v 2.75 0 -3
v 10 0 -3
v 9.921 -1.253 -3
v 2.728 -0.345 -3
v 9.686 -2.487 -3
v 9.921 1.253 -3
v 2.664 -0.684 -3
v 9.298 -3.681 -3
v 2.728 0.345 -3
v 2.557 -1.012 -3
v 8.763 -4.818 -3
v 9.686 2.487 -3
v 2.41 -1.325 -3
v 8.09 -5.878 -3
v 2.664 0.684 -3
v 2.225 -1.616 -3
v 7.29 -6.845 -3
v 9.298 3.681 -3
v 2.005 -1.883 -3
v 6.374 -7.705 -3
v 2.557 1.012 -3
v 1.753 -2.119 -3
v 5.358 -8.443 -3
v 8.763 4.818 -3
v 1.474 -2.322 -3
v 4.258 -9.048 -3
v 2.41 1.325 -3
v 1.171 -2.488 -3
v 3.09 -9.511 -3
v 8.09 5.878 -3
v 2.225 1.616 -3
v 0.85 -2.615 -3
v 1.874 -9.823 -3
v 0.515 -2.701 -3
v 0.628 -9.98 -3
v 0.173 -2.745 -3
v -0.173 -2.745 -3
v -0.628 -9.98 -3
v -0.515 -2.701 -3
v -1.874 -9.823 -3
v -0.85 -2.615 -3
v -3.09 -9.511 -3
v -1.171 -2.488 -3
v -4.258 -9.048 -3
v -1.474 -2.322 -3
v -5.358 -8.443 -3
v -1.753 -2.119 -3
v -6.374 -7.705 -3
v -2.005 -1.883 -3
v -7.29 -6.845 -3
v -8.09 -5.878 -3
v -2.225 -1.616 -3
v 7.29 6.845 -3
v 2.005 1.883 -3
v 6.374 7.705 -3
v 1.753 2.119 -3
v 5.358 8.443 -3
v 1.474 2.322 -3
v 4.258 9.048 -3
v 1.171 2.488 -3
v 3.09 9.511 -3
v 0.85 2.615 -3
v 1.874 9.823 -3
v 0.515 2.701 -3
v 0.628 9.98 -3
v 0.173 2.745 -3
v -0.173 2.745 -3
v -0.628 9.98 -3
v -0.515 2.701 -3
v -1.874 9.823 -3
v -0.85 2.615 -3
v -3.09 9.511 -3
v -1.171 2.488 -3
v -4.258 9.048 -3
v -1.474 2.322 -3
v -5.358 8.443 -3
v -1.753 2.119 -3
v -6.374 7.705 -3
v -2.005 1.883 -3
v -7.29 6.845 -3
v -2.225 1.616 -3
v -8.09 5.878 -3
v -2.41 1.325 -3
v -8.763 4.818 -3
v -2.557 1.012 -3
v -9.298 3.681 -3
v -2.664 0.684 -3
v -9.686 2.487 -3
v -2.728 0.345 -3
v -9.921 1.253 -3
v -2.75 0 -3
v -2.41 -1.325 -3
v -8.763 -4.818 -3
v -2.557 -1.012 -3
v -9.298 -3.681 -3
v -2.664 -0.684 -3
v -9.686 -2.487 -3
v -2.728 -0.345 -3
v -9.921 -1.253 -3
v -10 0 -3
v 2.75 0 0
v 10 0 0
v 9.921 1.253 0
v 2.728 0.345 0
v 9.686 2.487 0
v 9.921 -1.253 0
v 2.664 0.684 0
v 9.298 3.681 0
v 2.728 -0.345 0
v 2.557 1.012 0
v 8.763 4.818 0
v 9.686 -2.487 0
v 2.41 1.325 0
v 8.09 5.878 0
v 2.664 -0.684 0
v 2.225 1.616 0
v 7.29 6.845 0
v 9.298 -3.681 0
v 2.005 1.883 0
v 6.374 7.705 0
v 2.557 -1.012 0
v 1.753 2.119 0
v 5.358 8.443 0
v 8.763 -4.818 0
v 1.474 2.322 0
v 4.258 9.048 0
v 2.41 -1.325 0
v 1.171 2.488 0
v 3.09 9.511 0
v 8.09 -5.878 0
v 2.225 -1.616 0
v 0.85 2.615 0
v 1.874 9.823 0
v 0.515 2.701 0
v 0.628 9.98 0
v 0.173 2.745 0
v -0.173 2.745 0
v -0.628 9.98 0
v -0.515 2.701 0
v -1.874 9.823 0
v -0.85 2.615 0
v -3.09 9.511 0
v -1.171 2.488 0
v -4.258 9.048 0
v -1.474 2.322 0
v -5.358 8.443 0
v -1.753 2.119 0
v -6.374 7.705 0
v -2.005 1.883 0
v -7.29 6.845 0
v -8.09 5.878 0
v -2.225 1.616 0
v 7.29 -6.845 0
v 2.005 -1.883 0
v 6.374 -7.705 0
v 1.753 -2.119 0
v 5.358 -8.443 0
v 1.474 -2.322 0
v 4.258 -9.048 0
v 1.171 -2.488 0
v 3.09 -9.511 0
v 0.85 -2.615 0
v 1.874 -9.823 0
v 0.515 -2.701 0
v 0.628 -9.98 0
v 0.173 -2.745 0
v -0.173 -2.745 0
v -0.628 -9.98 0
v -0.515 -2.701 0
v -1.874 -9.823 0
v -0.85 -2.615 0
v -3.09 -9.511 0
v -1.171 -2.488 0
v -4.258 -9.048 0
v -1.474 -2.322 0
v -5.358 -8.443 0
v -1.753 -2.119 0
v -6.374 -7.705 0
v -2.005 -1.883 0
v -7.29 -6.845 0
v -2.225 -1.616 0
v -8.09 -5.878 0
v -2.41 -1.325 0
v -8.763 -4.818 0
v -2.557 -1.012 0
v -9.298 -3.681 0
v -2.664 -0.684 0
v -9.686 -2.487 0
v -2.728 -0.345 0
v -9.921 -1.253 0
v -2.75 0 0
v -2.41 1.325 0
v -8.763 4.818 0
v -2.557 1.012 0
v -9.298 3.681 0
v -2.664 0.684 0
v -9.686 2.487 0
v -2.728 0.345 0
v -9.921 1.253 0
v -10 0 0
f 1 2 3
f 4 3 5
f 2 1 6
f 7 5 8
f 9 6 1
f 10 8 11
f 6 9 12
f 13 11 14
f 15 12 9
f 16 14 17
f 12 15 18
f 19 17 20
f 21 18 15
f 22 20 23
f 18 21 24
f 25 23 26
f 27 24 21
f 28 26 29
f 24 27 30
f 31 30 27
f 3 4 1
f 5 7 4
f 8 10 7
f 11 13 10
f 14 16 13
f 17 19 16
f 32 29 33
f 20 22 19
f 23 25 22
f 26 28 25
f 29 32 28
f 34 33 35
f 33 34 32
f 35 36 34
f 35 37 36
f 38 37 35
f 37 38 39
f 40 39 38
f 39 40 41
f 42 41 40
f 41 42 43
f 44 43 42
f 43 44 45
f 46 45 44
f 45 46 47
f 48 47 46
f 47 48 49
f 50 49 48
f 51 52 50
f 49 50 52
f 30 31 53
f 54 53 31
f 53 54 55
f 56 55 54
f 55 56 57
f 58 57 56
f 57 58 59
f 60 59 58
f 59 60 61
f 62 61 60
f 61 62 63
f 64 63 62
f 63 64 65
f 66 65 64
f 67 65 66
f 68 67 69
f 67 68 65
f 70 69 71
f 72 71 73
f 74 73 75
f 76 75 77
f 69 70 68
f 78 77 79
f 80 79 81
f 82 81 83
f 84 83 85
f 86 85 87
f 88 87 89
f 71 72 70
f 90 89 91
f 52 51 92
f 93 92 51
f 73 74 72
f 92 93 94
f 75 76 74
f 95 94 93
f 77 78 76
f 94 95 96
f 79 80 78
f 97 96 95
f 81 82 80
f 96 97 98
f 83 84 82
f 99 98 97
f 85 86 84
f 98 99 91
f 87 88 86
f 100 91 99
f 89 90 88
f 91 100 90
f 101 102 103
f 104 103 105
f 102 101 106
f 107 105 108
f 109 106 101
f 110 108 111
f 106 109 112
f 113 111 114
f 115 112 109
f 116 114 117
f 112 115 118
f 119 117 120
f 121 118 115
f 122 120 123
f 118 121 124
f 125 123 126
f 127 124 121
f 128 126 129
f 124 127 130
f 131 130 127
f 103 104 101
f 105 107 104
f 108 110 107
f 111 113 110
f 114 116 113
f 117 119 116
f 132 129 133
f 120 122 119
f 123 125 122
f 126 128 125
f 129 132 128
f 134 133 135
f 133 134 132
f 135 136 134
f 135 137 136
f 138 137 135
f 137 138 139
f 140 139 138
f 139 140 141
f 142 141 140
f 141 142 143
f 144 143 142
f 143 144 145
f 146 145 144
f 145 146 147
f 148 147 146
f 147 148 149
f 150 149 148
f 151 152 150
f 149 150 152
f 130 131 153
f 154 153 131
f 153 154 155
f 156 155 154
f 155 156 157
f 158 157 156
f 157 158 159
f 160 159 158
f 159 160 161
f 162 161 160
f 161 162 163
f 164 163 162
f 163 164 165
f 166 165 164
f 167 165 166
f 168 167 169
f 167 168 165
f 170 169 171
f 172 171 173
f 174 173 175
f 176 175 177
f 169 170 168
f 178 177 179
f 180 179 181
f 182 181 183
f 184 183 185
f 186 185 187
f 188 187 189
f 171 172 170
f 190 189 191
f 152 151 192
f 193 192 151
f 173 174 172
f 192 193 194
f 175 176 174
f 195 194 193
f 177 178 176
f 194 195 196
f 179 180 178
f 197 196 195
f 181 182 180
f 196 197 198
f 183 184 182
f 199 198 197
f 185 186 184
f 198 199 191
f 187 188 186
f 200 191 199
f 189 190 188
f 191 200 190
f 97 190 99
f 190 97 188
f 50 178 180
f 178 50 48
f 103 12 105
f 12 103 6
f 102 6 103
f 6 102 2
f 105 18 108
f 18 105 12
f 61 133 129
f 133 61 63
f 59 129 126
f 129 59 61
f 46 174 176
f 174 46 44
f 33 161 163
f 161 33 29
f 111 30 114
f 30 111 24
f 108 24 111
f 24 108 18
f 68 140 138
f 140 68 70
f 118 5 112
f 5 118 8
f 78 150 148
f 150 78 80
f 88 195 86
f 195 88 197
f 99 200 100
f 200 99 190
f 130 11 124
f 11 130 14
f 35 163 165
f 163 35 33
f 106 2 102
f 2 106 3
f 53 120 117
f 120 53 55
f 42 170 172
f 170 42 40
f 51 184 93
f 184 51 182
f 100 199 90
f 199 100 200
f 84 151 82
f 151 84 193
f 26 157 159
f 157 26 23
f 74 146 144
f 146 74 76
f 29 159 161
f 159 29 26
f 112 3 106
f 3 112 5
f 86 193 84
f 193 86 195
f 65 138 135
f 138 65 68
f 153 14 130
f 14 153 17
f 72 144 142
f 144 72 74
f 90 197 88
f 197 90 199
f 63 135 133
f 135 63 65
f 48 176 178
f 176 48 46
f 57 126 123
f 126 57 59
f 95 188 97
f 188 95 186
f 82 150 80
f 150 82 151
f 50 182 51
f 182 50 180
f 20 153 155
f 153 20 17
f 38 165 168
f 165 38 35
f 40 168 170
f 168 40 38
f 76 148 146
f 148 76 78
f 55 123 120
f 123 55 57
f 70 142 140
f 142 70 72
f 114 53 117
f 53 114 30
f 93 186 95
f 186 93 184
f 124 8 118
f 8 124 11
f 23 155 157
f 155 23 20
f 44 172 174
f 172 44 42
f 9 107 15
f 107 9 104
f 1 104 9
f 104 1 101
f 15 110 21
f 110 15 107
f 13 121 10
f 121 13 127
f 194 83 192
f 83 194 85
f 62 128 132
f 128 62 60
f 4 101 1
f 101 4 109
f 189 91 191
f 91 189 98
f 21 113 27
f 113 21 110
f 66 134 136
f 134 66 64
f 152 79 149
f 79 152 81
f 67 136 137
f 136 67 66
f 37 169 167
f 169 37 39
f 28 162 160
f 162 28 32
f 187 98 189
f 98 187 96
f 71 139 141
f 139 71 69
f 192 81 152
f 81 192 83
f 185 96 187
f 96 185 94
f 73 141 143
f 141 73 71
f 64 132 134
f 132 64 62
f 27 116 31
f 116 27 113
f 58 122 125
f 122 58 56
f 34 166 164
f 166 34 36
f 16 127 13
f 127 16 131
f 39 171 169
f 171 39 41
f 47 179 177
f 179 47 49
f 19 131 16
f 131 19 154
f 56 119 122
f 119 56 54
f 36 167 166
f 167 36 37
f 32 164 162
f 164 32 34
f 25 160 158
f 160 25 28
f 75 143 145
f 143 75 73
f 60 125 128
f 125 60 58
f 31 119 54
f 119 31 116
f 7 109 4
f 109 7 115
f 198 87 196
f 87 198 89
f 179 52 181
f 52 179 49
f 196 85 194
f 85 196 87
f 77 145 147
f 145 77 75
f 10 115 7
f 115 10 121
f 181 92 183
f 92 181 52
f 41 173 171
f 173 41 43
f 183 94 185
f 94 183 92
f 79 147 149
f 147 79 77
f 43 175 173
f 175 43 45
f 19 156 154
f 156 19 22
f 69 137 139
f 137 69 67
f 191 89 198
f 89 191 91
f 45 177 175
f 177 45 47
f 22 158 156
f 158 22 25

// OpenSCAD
$fn = 50;


difference() {
	union() {
		translate(v = [0, 0, -3.0000000000]) {
			cylinder(h = 3, r = 7.0000000000);
		}
		translate(v = [0, 0, -3.0000000000]) {
			cylinder(h = 3, r = 10.0000000000);
		}
	}
	union() {
		#translate(v = [0, 0, -3]) {
			cylinder(h = 3, r = 2.7500000000);
		}
	}
}
